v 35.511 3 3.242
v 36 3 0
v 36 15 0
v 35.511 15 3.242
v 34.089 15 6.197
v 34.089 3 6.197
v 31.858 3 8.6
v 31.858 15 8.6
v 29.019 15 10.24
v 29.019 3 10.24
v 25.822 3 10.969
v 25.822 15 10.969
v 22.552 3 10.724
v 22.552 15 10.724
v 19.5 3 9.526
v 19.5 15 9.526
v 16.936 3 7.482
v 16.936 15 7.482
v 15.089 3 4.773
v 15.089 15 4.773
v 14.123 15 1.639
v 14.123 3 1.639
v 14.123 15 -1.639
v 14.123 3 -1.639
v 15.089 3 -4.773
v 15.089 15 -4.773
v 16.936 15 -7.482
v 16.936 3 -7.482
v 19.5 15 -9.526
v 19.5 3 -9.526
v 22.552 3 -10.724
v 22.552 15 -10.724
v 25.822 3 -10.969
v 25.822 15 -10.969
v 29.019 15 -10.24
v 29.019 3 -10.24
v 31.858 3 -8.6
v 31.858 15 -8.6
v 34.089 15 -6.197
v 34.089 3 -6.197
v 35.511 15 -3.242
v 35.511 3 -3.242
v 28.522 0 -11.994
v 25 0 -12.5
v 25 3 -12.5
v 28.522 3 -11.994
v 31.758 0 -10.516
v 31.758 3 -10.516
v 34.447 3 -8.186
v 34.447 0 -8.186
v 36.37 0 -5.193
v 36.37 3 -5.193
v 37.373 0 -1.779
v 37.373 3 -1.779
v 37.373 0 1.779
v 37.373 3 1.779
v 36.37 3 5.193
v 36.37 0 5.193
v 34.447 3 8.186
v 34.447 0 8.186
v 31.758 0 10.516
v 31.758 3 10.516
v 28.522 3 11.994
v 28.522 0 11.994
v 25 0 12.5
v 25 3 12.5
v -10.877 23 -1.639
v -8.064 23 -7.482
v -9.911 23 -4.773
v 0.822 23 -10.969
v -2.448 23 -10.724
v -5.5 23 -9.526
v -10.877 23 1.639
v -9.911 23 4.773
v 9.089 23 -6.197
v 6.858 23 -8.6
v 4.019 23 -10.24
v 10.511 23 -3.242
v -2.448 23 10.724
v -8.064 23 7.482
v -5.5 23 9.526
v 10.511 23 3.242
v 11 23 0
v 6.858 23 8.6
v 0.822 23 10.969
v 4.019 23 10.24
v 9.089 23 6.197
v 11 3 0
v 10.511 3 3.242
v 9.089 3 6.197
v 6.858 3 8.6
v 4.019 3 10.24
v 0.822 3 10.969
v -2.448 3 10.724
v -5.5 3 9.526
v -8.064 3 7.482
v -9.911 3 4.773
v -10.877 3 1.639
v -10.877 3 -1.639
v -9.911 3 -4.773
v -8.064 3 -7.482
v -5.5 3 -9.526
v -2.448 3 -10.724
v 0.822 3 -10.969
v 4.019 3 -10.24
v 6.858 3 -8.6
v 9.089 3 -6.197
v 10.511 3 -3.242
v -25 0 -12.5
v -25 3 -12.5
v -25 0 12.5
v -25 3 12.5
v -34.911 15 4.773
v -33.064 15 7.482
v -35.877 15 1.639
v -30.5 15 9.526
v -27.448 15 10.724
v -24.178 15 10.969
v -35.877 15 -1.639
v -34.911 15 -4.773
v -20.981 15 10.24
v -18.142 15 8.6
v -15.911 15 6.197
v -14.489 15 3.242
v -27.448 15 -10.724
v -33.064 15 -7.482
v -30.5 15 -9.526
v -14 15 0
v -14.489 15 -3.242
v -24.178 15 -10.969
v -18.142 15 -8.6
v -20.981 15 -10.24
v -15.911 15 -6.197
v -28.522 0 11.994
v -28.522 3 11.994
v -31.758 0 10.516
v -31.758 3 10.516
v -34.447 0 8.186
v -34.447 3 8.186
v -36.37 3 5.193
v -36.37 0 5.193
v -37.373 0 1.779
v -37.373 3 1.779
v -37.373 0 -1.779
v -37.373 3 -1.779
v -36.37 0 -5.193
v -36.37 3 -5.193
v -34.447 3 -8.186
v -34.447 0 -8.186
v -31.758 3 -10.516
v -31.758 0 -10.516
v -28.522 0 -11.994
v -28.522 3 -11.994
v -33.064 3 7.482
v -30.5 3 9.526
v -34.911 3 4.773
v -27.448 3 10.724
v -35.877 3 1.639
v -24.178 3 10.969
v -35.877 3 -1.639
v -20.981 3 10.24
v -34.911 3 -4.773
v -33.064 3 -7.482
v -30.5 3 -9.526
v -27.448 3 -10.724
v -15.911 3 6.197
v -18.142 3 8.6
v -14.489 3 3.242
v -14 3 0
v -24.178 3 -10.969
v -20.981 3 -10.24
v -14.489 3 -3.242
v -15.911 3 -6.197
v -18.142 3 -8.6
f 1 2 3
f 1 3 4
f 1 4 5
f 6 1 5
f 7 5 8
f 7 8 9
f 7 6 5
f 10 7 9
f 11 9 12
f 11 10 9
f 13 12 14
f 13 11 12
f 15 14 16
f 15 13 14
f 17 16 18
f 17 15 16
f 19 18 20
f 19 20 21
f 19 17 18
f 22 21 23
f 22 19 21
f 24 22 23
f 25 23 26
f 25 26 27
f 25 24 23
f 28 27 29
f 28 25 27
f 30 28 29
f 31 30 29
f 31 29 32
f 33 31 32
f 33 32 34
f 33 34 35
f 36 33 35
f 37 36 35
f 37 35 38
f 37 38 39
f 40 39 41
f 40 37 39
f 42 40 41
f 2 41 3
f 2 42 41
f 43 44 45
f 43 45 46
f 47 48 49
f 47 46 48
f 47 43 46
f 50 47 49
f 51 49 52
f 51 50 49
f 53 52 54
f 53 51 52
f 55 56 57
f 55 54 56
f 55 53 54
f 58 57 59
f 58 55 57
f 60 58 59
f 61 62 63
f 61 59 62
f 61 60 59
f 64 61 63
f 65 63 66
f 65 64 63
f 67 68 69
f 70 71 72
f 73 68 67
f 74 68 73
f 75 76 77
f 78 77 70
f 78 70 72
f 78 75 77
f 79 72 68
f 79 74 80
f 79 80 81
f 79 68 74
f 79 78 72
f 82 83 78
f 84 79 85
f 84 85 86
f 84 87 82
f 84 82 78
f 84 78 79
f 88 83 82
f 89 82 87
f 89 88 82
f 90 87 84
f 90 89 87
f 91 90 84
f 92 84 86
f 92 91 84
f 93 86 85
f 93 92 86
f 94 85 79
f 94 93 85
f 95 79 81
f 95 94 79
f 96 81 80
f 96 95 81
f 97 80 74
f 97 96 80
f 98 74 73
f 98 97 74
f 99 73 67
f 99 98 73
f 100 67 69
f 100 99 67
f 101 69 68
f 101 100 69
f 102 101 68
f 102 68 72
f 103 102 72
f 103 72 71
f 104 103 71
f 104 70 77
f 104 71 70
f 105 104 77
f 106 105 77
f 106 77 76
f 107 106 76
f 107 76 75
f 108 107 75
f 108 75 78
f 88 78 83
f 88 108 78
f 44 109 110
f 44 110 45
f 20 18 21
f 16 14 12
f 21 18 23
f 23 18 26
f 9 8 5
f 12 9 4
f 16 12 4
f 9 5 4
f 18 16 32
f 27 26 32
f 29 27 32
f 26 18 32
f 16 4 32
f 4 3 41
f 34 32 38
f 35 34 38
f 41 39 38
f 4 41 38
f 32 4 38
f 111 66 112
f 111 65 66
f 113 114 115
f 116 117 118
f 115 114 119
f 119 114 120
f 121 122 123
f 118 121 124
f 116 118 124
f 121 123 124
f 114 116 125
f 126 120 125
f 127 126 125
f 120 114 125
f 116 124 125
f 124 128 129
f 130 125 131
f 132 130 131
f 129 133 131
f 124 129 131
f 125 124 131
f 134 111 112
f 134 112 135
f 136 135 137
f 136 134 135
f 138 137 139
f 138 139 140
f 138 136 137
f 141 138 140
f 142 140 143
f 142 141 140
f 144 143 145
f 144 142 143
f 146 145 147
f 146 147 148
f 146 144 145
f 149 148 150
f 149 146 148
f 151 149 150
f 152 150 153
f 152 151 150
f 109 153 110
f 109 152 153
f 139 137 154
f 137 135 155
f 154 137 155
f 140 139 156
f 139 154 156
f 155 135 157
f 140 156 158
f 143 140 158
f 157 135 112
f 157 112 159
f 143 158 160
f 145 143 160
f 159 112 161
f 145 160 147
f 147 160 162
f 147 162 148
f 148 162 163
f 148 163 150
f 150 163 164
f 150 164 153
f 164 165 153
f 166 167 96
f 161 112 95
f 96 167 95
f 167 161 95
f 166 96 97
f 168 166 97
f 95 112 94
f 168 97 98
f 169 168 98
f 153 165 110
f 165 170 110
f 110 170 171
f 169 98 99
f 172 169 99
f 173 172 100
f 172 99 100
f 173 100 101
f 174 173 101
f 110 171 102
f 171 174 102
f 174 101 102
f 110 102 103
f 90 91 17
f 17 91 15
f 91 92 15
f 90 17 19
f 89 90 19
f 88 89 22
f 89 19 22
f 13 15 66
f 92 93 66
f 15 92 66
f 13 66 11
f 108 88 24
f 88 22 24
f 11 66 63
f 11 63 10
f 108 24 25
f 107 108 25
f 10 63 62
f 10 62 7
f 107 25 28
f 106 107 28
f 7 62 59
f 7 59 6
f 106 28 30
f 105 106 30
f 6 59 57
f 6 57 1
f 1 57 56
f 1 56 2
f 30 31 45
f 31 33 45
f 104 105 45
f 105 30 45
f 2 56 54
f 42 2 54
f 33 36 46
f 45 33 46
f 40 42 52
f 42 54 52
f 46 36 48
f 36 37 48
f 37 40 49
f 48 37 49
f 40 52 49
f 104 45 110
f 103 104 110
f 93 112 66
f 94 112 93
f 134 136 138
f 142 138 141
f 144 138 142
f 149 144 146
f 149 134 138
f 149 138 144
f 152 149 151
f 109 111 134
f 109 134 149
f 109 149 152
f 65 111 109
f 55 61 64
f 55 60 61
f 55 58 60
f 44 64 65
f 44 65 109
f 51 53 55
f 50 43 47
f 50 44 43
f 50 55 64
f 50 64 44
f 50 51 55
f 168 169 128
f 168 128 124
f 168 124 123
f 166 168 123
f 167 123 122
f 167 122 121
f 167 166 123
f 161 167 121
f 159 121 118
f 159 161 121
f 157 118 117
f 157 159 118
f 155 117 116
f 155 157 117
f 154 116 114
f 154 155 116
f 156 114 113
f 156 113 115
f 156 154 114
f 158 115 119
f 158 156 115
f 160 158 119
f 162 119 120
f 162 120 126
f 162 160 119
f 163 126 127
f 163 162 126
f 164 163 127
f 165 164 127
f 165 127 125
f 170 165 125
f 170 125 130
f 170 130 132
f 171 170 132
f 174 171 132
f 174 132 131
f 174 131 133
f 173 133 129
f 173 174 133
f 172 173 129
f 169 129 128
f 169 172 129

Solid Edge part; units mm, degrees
sketch "Sketch1" plane through (0, 0, 0) normal (0, -1, 0) x (1, 0, 0)
  line L0 (-25, -12.5) -> (25, -12.5)
  arc A0 (25, 12.5) -> (25, -12.5) centre (25, 0) cw
  line L1 (25, 12.5) -> (-25, 12.5)
  arc A1 (-25, 12.5) -> (-25, -12.5) centre (-25, 0) ccw
  dimension "D1" = 50
  dimension "D2" = 25
  dimension "D3" = 12.5
extrude "Protrusion1" add sketch "Sketch1" against normal blind 3
sketch "Sketch2" plane through (0, 0, 0) normal (0, -1, 0) x (1, 0, 0)
  circle A0 centre (-25, 0) radius 11
  circle A1 centre (25, 0) radius 11
  dimension "D1" = 22
extrude "Extrusionsausprägung_2" add sketch "Sketch2" against normal blind 15
sketch "Sketch3" plane through (0, 3, 0) normal (0, 1, 0) x (1, 0, 0)
  circle A0 centre (0, 0) radius 11
  dimension "D1" = 22
extrude "Extrusionsausprägung_3" add sketch "Sketch3" along normal blind 20
properties material "Polykarbonat"
